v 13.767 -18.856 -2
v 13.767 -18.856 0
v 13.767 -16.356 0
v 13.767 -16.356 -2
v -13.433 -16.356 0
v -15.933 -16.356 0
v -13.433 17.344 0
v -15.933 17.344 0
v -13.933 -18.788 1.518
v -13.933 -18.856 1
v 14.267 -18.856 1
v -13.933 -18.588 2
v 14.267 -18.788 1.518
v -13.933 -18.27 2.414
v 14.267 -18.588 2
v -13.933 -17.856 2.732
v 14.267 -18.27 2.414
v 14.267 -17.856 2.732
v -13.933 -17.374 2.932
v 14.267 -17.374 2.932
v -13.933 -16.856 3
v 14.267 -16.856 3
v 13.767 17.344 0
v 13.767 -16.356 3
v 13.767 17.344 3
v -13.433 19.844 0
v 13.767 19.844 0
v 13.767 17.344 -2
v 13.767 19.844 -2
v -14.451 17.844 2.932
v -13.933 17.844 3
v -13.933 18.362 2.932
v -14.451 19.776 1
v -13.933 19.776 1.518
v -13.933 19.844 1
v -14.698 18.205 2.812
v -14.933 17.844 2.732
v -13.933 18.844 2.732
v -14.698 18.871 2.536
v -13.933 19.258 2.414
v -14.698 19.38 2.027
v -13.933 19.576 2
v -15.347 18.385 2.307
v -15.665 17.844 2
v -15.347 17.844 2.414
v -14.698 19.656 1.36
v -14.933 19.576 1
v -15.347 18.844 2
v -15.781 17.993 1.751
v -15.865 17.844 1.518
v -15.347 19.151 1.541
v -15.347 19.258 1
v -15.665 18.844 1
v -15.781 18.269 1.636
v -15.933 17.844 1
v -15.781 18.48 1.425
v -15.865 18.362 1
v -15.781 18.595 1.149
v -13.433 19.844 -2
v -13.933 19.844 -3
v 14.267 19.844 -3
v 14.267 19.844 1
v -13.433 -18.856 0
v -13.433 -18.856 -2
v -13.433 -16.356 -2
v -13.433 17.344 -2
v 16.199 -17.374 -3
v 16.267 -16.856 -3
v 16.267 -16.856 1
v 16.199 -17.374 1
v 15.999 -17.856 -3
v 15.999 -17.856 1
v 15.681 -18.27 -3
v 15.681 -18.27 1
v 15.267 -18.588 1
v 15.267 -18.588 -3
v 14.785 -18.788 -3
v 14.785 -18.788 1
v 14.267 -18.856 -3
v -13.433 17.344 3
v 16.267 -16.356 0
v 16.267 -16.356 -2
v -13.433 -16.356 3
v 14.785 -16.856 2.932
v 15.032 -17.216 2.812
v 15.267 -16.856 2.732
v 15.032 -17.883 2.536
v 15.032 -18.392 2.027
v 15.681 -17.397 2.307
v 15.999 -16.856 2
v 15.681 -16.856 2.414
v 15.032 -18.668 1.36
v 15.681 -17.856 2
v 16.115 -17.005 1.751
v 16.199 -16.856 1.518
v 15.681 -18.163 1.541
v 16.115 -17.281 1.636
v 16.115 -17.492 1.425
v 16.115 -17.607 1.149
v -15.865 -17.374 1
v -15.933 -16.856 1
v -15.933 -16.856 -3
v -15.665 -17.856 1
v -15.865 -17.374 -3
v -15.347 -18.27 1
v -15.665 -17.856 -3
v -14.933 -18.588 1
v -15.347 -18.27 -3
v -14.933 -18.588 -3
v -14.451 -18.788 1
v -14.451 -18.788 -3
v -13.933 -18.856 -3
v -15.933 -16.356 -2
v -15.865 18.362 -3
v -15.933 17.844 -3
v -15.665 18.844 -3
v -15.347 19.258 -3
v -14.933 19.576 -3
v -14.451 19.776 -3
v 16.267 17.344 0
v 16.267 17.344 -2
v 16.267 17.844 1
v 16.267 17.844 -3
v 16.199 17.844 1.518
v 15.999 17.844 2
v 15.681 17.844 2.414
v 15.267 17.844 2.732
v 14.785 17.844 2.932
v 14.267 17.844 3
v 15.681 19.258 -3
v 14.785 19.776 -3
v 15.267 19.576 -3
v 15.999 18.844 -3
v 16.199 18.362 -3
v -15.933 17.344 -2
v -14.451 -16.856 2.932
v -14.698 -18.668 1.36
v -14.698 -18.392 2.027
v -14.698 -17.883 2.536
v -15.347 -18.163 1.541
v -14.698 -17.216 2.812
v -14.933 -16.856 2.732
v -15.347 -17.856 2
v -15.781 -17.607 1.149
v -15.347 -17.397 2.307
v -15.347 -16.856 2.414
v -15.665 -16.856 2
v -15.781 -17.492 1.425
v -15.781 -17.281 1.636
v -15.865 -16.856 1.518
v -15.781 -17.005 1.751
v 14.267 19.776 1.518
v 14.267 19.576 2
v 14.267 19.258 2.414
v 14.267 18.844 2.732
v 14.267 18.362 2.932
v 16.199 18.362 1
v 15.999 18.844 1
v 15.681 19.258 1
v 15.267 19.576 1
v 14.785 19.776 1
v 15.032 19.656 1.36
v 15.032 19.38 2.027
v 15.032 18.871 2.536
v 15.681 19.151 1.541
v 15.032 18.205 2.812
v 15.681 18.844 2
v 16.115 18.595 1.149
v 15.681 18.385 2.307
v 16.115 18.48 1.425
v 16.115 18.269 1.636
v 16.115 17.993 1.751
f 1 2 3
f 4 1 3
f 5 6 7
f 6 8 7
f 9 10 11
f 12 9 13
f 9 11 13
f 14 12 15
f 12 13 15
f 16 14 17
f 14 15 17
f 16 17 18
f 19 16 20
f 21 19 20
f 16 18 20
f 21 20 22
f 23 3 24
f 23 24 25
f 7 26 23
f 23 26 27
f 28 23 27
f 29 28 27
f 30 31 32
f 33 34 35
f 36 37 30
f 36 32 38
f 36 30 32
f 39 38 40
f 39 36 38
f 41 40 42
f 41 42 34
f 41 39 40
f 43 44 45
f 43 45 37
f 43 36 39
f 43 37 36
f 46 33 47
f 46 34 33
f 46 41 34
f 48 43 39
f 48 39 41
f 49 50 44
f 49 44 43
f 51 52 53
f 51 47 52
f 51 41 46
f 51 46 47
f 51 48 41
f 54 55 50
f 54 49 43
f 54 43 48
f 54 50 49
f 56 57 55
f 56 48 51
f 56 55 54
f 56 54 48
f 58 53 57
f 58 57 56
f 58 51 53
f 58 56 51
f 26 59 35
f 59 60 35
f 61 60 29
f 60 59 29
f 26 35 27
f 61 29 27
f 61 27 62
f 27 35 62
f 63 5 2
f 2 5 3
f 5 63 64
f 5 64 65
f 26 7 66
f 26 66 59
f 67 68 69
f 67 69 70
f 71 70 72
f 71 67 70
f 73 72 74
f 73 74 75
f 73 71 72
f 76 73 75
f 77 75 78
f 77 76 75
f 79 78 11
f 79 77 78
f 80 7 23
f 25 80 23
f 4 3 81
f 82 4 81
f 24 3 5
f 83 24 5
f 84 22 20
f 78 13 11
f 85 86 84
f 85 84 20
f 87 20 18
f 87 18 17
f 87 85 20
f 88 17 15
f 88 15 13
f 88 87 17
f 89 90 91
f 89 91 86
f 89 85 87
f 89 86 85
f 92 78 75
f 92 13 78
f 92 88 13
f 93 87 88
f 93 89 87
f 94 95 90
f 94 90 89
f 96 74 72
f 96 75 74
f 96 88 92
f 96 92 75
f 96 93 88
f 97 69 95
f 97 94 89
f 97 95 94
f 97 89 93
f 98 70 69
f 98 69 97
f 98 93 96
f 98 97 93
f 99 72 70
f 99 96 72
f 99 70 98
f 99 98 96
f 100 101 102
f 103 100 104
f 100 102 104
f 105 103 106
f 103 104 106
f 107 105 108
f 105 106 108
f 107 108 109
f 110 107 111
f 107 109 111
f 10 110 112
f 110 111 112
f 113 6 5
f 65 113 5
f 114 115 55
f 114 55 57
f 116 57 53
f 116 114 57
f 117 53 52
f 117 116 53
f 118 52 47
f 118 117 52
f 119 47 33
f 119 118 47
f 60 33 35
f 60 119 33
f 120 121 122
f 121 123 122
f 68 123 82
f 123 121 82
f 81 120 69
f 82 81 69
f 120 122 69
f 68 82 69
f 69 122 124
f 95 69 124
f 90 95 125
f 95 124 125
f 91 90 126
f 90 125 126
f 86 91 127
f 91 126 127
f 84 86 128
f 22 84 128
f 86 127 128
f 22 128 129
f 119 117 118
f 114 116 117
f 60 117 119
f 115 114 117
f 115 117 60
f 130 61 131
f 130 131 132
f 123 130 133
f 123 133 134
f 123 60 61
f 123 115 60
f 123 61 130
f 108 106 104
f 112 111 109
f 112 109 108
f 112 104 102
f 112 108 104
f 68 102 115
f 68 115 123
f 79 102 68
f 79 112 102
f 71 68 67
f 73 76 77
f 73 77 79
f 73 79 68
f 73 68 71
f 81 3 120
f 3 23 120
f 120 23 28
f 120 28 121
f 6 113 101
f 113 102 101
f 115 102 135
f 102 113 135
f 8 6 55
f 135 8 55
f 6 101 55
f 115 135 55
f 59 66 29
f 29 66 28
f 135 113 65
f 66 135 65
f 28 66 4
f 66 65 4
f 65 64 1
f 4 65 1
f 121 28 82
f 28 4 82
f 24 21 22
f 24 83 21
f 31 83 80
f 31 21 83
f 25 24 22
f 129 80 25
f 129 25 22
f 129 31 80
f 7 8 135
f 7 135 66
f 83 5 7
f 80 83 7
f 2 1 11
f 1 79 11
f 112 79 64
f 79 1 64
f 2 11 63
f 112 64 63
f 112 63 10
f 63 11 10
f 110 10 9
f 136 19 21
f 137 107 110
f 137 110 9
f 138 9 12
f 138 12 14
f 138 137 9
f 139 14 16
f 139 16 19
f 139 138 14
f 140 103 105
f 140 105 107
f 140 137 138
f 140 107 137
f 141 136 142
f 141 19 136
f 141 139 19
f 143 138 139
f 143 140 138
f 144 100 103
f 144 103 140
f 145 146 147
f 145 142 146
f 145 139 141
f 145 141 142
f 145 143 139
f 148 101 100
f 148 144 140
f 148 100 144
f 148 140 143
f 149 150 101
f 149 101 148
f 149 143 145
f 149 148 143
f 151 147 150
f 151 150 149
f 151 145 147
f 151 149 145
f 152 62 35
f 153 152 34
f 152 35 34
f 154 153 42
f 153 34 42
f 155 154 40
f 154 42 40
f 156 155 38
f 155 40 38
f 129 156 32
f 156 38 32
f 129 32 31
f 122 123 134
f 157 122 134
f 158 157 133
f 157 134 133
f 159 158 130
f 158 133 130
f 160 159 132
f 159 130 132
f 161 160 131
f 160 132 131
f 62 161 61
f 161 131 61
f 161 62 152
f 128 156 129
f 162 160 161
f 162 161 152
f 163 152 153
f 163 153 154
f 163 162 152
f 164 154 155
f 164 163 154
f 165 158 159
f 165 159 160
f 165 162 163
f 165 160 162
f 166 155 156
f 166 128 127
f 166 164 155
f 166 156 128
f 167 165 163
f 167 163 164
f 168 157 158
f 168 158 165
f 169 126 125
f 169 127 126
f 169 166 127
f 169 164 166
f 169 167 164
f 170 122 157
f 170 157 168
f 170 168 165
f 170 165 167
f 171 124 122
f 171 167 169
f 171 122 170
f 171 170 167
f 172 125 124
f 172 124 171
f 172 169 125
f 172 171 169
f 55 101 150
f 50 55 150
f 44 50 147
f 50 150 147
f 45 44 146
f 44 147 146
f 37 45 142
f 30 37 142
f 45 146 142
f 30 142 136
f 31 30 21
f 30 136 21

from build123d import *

# Parameters (mm, degrees)
F0_W         = 27.2
F0_H         = 2.5
F0_W_2       = 2.5
F0_H_2       = 33.7
F1_DEPTH     = 3
F2_R         = 2
F3_DEPTH     = 2
F4_W         = 2.5
F4_H         = 2.5
F5_DEPTH     = 1
F6_T1_DEPTH  = 9
F6_S5_W      = 2
F6_S5_H      = 2
F6_T6_DEPTH  = 2
F6_S11_W     = 2
F6_S11_H     = 2
F6_T12_DEPTH = 2
F6_S17_W     = 2
F6_S17_H     = 2
F6_T18_DEPTH = 2
F6_S23_W     = 2
F6_S23_H     = 2
F6_T24_DEPTH = 2


# Not quite as in the source:
# - a fillet or chamfer that OpenCascade refuses, or shapes differently, is made with other operations: its cross-section is extruded or revolved along the edge and cut away or added


with BuildPart() as f1:
    # F0 (on Top) → F1 (new body)
    with BuildSketch(Plane.XY):
        with Locations((0.1669520199, 18.5940534235)):
            Rectangle(F0_W, F0_H)
        with Locations((-14.6830479801, 0.4940534235)):
            Rectangle(F0_W_2, F0_H_2)
        with Locations((-14.6830479801, 18.5940534235)):
            Rectangle(F0_W_2, F0_H)
        with Locations((-14.6830479801, -17.6059465765)):
            Rectangle(F0_W_2, F0_H)
        with Locations((0.1669520199, -17.6059465765)):
            Rectangle(F0_W, F0_H)
        with Locations((15.0169520199, -17.6059465765)):
            Rectangle(F0_W_2, F0_H)
        with Locations((15.0169520199, 0.4940534235)):
            Rectangle(F0_W_2, F0_H_2)
        with Locations((15.0169520199, 18.5940534235)):
            Rectangle(F0_W_2, F0_H)
    extrude(amount=F1_DEPTH)

    # F2
    f2_edges = [f1.edges().sort_by_distance(p)[0] for p in [
        (16.266952, 0.494053, 3),
        (0.166952, 19.844053, 3),
        (-15.933048, 0.494053, 3),
        (0.166952, -18.855947, 3),
    ]]
    fillet(f2_edges, radius=F2_R)

    # F0 (on Top) → F3 (join)
    with BuildSketch(Plane.XY):
        with Locations((-14.6830479801, -17.6059465765)):
            Rectangle(F0_W_2, F0_H)
        with Locations((15.0169520199, -17.6059465765)):
            Rectangle(F0_W_2, F0_H)
        with Locations((15.0169520199, 18.5940534235)):
            Rectangle(F0_W_2, F0_H)
        with Locations((-14.6830479801, 18.5940534235)):
            Rectangle(F0_W_2, F0_H)
    extrude(amount=-F3_DEPTH)

    # F4 (on face) → F5 (join)
    with BuildSketch(Plane(origin=(0, 0, -2), x_dir=(1, 0, 0), z_dir=(0, 0, -1))):
        Polygon((-13.4330479801, -19.8440534235), (16.2669520199, -19.8440534235), (16.2669520199, 18.8559465765), (-15.9330479801, 18.8559465765), (-15.9330479801, -17.3440534235), (-13.4330479801, -17.3440534235), align=None)
        with Locations((-14.6830479801, -18.5940534235)):
            Rectangle(F4_W, F4_H)
    extrude(amount=F5_DEPTH)

    # F6: fillet of radius 2 on 4 edges, made by hand

    # F6_s2 → F6_t1 (cut)
    with BuildSketch(Plane.XY.offset(-8)):
        with BuildLine():
            ThreePointArc((16.2669520199, 17.8440534235), (15.6811655823, 19.2582669858), (14.2669520199, 19.8440534235))
            Line((14.2669520199, 19.8440534235), (16.2669520199, 19.8440534235))
            Line((16.2669520199, 19.8440534235), (16.2669520199, 17.8440534235))
        make_face()
        with BuildLine():
            ThreePointArc((16.2669520199, -16.8559465765), (15.6811655823, -18.2701601389), (14.2669520199, -18.8559465765))
            Line((14.2669520199, -18.8559465765), (16.2669520199, -18.8559465765))
            Line((16.2669520199, -18.8559465765), (16.2669520199, -16.8559465765))
        make_face()
        with BuildLine():
            ThreePointArc((-15.9330479801, -16.8559465765), (-15.3472615424, -18.2701601389), (-13.9330479801, -18.8559465765))
            Line((-13.9330479801, -18.8559465765), (-15.9330479801, -18.8559465765))
            Line((-15.9330479801, -18.8559465765), (-15.9330479801, -16.8559465765))
        make_face()
        with BuildLine():
            ThreePointArc((-15.9330479801, 17.8440534235), (-15.3472615424, 19.2582669858), (-13.9330479801, 19.8440534235))
            Line((-13.9330479801, 19.8440534235), (-15.9330479801, 19.8440534235))
            Line((-15.9330479801, 19.8440534235), (-15.9330479801, 17.8440534235))
        make_face()
    extrude(amount=F6_T1_DEPTH, mode=Mode.SUBTRACT)


with BuildPart() as f6_tool4:
    # F6_s5 → F6_t6 (new body)
    with BuildSketch(Plane.YZ.offset(-13.9330479801)):
        with Locations((18.8440534235, 2)):
            Rectangle(F6_S5_W, F6_S5_H)
    extrude(amount=-F6_T6_DEPTH)

    # F6_s7 → F6_t8 (revolve, cut)
    with BuildSketch(Plane(origin=(-13.9330479801, 17.8440534235, 1), x_dir=(0, -0.7071067812, -0.7071067812), z_dir=(0, 0.7071067812, -0.7071067812))):
        with BuildLine():
            ThreePointArc((0, -2), (2, 0), (0, 2))
            Line((0, 2), (0, -2))
        make_face()
    revolve(axis=Axis((-13.9330479801, 17.8440534235, 1), (-1, 0, 0)), mode=Mode.SUBTRACT)


with BuildPart() as f1_1:
    add(f1.part)

    # F6_t3: cut F6_tool4
    add(f6_tool4.part, mode=Mode.SUBTRACT)


with BuildPart() as f6_tool10:
    # F6_s11 → F6_t12 (new body)
    with BuildSketch(Plane.YZ.offset(-13.9330479801)):
        with Locations((-17.8559465765, 2)):
            Rectangle(F6_S11_W, F6_S11_H)
    extrude(amount=-F6_T12_DEPTH)

    # F6_s13 → F6_t14 (revolve, cut)
    with BuildSketch(Plane(origin=(-13.9330479801, -16.8559465765, 1), x_dir=(0, 0.7071067812, -0.7071067812), z_dir=(0, 0.7071067812, 0.7071067812))):
        with BuildLine():
            ThreePointArc((0, -2), (2, 0), (0, 2))
            Line((0, 2), (0, -2))
        make_face()
    revolve(axis=Axis((-13.9330479801, -16.8559465765, 1), (-1, 0, 0)), mode=Mode.SUBTRACT)


with BuildPart() as f1_2:
    add(f1_1.part)

    # F6_t9: cut F6_tool10
    add(f6_tool10.part, mode=Mode.SUBTRACT)


with BuildPart() as f6_tool16:
    # F6_s17 → F6_t18 (new body)
    with BuildSketch(Plane.YZ.offset(14.2669520199)):
        with Locations((-17.8559465765, 2)):
            Rectangle(F6_S17_W, F6_S17_H)
    extrude(amount=F6_T18_DEPTH)

    # F6_s19 → F6_t20 (revolve, cut)
    with BuildSketch(Plane(origin=(14.2669520199, -16.8559465765, 1), x_dir=(0, 0.7071067812, -0.7071067812), z_dir=(0, -0.7071067812, -0.7071067812))):
        with BuildLine():
            ThreePointArc((0, -2), (2, 0), (0, 2))
            Line((0, 2), (0, -2))
        make_face()
    revolve(axis=Axis((14.2669520199, -16.8559465765, 1), (1, 0, 0)), mode=Mode.SUBTRACT)


with BuildPart() as f1_3:
    add(f1_2.part)

    # F6_t15: cut F6_tool16
    add(f6_tool16.part, mode=Mode.SUBTRACT)


with BuildPart() as f6_tool22:
    # F6_s23 → F6_t24 (new body)
    with BuildSketch(Plane.YZ.offset(14.2669520199)):
        with Locations((18.8440534235, 2)):
            Rectangle(F6_S23_W, F6_S23_H)
    extrude(amount=F6_T24_DEPTH)

    # F6_s25 → F6_t26 (revolve, cut)
    with BuildSketch(Plane(origin=(14.2669520199, 17.8440534235, 1), x_dir=(0, -0.7071067812, -0.7071067812), z_dir=(0, -0.7071067812, 0.7071067812))):
        with BuildLine():
            ThreePointArc((0, -2), (2, 0), (0, 2))
            Line((0, 2), (0, -2))
        make_face()
    revolve(axis=Axis((14.2669520199, 17.8440534235, 1), (1, 0, 0)), mode=Mode.SUBTRACT)


with BuildPart() as f1_4:
    add(f1_3.part)

    # F6_t21: cut F6_tool22
    add(f6_tool22.part, mode=Mode.SUBTRACT)


solid = f1_4.part
